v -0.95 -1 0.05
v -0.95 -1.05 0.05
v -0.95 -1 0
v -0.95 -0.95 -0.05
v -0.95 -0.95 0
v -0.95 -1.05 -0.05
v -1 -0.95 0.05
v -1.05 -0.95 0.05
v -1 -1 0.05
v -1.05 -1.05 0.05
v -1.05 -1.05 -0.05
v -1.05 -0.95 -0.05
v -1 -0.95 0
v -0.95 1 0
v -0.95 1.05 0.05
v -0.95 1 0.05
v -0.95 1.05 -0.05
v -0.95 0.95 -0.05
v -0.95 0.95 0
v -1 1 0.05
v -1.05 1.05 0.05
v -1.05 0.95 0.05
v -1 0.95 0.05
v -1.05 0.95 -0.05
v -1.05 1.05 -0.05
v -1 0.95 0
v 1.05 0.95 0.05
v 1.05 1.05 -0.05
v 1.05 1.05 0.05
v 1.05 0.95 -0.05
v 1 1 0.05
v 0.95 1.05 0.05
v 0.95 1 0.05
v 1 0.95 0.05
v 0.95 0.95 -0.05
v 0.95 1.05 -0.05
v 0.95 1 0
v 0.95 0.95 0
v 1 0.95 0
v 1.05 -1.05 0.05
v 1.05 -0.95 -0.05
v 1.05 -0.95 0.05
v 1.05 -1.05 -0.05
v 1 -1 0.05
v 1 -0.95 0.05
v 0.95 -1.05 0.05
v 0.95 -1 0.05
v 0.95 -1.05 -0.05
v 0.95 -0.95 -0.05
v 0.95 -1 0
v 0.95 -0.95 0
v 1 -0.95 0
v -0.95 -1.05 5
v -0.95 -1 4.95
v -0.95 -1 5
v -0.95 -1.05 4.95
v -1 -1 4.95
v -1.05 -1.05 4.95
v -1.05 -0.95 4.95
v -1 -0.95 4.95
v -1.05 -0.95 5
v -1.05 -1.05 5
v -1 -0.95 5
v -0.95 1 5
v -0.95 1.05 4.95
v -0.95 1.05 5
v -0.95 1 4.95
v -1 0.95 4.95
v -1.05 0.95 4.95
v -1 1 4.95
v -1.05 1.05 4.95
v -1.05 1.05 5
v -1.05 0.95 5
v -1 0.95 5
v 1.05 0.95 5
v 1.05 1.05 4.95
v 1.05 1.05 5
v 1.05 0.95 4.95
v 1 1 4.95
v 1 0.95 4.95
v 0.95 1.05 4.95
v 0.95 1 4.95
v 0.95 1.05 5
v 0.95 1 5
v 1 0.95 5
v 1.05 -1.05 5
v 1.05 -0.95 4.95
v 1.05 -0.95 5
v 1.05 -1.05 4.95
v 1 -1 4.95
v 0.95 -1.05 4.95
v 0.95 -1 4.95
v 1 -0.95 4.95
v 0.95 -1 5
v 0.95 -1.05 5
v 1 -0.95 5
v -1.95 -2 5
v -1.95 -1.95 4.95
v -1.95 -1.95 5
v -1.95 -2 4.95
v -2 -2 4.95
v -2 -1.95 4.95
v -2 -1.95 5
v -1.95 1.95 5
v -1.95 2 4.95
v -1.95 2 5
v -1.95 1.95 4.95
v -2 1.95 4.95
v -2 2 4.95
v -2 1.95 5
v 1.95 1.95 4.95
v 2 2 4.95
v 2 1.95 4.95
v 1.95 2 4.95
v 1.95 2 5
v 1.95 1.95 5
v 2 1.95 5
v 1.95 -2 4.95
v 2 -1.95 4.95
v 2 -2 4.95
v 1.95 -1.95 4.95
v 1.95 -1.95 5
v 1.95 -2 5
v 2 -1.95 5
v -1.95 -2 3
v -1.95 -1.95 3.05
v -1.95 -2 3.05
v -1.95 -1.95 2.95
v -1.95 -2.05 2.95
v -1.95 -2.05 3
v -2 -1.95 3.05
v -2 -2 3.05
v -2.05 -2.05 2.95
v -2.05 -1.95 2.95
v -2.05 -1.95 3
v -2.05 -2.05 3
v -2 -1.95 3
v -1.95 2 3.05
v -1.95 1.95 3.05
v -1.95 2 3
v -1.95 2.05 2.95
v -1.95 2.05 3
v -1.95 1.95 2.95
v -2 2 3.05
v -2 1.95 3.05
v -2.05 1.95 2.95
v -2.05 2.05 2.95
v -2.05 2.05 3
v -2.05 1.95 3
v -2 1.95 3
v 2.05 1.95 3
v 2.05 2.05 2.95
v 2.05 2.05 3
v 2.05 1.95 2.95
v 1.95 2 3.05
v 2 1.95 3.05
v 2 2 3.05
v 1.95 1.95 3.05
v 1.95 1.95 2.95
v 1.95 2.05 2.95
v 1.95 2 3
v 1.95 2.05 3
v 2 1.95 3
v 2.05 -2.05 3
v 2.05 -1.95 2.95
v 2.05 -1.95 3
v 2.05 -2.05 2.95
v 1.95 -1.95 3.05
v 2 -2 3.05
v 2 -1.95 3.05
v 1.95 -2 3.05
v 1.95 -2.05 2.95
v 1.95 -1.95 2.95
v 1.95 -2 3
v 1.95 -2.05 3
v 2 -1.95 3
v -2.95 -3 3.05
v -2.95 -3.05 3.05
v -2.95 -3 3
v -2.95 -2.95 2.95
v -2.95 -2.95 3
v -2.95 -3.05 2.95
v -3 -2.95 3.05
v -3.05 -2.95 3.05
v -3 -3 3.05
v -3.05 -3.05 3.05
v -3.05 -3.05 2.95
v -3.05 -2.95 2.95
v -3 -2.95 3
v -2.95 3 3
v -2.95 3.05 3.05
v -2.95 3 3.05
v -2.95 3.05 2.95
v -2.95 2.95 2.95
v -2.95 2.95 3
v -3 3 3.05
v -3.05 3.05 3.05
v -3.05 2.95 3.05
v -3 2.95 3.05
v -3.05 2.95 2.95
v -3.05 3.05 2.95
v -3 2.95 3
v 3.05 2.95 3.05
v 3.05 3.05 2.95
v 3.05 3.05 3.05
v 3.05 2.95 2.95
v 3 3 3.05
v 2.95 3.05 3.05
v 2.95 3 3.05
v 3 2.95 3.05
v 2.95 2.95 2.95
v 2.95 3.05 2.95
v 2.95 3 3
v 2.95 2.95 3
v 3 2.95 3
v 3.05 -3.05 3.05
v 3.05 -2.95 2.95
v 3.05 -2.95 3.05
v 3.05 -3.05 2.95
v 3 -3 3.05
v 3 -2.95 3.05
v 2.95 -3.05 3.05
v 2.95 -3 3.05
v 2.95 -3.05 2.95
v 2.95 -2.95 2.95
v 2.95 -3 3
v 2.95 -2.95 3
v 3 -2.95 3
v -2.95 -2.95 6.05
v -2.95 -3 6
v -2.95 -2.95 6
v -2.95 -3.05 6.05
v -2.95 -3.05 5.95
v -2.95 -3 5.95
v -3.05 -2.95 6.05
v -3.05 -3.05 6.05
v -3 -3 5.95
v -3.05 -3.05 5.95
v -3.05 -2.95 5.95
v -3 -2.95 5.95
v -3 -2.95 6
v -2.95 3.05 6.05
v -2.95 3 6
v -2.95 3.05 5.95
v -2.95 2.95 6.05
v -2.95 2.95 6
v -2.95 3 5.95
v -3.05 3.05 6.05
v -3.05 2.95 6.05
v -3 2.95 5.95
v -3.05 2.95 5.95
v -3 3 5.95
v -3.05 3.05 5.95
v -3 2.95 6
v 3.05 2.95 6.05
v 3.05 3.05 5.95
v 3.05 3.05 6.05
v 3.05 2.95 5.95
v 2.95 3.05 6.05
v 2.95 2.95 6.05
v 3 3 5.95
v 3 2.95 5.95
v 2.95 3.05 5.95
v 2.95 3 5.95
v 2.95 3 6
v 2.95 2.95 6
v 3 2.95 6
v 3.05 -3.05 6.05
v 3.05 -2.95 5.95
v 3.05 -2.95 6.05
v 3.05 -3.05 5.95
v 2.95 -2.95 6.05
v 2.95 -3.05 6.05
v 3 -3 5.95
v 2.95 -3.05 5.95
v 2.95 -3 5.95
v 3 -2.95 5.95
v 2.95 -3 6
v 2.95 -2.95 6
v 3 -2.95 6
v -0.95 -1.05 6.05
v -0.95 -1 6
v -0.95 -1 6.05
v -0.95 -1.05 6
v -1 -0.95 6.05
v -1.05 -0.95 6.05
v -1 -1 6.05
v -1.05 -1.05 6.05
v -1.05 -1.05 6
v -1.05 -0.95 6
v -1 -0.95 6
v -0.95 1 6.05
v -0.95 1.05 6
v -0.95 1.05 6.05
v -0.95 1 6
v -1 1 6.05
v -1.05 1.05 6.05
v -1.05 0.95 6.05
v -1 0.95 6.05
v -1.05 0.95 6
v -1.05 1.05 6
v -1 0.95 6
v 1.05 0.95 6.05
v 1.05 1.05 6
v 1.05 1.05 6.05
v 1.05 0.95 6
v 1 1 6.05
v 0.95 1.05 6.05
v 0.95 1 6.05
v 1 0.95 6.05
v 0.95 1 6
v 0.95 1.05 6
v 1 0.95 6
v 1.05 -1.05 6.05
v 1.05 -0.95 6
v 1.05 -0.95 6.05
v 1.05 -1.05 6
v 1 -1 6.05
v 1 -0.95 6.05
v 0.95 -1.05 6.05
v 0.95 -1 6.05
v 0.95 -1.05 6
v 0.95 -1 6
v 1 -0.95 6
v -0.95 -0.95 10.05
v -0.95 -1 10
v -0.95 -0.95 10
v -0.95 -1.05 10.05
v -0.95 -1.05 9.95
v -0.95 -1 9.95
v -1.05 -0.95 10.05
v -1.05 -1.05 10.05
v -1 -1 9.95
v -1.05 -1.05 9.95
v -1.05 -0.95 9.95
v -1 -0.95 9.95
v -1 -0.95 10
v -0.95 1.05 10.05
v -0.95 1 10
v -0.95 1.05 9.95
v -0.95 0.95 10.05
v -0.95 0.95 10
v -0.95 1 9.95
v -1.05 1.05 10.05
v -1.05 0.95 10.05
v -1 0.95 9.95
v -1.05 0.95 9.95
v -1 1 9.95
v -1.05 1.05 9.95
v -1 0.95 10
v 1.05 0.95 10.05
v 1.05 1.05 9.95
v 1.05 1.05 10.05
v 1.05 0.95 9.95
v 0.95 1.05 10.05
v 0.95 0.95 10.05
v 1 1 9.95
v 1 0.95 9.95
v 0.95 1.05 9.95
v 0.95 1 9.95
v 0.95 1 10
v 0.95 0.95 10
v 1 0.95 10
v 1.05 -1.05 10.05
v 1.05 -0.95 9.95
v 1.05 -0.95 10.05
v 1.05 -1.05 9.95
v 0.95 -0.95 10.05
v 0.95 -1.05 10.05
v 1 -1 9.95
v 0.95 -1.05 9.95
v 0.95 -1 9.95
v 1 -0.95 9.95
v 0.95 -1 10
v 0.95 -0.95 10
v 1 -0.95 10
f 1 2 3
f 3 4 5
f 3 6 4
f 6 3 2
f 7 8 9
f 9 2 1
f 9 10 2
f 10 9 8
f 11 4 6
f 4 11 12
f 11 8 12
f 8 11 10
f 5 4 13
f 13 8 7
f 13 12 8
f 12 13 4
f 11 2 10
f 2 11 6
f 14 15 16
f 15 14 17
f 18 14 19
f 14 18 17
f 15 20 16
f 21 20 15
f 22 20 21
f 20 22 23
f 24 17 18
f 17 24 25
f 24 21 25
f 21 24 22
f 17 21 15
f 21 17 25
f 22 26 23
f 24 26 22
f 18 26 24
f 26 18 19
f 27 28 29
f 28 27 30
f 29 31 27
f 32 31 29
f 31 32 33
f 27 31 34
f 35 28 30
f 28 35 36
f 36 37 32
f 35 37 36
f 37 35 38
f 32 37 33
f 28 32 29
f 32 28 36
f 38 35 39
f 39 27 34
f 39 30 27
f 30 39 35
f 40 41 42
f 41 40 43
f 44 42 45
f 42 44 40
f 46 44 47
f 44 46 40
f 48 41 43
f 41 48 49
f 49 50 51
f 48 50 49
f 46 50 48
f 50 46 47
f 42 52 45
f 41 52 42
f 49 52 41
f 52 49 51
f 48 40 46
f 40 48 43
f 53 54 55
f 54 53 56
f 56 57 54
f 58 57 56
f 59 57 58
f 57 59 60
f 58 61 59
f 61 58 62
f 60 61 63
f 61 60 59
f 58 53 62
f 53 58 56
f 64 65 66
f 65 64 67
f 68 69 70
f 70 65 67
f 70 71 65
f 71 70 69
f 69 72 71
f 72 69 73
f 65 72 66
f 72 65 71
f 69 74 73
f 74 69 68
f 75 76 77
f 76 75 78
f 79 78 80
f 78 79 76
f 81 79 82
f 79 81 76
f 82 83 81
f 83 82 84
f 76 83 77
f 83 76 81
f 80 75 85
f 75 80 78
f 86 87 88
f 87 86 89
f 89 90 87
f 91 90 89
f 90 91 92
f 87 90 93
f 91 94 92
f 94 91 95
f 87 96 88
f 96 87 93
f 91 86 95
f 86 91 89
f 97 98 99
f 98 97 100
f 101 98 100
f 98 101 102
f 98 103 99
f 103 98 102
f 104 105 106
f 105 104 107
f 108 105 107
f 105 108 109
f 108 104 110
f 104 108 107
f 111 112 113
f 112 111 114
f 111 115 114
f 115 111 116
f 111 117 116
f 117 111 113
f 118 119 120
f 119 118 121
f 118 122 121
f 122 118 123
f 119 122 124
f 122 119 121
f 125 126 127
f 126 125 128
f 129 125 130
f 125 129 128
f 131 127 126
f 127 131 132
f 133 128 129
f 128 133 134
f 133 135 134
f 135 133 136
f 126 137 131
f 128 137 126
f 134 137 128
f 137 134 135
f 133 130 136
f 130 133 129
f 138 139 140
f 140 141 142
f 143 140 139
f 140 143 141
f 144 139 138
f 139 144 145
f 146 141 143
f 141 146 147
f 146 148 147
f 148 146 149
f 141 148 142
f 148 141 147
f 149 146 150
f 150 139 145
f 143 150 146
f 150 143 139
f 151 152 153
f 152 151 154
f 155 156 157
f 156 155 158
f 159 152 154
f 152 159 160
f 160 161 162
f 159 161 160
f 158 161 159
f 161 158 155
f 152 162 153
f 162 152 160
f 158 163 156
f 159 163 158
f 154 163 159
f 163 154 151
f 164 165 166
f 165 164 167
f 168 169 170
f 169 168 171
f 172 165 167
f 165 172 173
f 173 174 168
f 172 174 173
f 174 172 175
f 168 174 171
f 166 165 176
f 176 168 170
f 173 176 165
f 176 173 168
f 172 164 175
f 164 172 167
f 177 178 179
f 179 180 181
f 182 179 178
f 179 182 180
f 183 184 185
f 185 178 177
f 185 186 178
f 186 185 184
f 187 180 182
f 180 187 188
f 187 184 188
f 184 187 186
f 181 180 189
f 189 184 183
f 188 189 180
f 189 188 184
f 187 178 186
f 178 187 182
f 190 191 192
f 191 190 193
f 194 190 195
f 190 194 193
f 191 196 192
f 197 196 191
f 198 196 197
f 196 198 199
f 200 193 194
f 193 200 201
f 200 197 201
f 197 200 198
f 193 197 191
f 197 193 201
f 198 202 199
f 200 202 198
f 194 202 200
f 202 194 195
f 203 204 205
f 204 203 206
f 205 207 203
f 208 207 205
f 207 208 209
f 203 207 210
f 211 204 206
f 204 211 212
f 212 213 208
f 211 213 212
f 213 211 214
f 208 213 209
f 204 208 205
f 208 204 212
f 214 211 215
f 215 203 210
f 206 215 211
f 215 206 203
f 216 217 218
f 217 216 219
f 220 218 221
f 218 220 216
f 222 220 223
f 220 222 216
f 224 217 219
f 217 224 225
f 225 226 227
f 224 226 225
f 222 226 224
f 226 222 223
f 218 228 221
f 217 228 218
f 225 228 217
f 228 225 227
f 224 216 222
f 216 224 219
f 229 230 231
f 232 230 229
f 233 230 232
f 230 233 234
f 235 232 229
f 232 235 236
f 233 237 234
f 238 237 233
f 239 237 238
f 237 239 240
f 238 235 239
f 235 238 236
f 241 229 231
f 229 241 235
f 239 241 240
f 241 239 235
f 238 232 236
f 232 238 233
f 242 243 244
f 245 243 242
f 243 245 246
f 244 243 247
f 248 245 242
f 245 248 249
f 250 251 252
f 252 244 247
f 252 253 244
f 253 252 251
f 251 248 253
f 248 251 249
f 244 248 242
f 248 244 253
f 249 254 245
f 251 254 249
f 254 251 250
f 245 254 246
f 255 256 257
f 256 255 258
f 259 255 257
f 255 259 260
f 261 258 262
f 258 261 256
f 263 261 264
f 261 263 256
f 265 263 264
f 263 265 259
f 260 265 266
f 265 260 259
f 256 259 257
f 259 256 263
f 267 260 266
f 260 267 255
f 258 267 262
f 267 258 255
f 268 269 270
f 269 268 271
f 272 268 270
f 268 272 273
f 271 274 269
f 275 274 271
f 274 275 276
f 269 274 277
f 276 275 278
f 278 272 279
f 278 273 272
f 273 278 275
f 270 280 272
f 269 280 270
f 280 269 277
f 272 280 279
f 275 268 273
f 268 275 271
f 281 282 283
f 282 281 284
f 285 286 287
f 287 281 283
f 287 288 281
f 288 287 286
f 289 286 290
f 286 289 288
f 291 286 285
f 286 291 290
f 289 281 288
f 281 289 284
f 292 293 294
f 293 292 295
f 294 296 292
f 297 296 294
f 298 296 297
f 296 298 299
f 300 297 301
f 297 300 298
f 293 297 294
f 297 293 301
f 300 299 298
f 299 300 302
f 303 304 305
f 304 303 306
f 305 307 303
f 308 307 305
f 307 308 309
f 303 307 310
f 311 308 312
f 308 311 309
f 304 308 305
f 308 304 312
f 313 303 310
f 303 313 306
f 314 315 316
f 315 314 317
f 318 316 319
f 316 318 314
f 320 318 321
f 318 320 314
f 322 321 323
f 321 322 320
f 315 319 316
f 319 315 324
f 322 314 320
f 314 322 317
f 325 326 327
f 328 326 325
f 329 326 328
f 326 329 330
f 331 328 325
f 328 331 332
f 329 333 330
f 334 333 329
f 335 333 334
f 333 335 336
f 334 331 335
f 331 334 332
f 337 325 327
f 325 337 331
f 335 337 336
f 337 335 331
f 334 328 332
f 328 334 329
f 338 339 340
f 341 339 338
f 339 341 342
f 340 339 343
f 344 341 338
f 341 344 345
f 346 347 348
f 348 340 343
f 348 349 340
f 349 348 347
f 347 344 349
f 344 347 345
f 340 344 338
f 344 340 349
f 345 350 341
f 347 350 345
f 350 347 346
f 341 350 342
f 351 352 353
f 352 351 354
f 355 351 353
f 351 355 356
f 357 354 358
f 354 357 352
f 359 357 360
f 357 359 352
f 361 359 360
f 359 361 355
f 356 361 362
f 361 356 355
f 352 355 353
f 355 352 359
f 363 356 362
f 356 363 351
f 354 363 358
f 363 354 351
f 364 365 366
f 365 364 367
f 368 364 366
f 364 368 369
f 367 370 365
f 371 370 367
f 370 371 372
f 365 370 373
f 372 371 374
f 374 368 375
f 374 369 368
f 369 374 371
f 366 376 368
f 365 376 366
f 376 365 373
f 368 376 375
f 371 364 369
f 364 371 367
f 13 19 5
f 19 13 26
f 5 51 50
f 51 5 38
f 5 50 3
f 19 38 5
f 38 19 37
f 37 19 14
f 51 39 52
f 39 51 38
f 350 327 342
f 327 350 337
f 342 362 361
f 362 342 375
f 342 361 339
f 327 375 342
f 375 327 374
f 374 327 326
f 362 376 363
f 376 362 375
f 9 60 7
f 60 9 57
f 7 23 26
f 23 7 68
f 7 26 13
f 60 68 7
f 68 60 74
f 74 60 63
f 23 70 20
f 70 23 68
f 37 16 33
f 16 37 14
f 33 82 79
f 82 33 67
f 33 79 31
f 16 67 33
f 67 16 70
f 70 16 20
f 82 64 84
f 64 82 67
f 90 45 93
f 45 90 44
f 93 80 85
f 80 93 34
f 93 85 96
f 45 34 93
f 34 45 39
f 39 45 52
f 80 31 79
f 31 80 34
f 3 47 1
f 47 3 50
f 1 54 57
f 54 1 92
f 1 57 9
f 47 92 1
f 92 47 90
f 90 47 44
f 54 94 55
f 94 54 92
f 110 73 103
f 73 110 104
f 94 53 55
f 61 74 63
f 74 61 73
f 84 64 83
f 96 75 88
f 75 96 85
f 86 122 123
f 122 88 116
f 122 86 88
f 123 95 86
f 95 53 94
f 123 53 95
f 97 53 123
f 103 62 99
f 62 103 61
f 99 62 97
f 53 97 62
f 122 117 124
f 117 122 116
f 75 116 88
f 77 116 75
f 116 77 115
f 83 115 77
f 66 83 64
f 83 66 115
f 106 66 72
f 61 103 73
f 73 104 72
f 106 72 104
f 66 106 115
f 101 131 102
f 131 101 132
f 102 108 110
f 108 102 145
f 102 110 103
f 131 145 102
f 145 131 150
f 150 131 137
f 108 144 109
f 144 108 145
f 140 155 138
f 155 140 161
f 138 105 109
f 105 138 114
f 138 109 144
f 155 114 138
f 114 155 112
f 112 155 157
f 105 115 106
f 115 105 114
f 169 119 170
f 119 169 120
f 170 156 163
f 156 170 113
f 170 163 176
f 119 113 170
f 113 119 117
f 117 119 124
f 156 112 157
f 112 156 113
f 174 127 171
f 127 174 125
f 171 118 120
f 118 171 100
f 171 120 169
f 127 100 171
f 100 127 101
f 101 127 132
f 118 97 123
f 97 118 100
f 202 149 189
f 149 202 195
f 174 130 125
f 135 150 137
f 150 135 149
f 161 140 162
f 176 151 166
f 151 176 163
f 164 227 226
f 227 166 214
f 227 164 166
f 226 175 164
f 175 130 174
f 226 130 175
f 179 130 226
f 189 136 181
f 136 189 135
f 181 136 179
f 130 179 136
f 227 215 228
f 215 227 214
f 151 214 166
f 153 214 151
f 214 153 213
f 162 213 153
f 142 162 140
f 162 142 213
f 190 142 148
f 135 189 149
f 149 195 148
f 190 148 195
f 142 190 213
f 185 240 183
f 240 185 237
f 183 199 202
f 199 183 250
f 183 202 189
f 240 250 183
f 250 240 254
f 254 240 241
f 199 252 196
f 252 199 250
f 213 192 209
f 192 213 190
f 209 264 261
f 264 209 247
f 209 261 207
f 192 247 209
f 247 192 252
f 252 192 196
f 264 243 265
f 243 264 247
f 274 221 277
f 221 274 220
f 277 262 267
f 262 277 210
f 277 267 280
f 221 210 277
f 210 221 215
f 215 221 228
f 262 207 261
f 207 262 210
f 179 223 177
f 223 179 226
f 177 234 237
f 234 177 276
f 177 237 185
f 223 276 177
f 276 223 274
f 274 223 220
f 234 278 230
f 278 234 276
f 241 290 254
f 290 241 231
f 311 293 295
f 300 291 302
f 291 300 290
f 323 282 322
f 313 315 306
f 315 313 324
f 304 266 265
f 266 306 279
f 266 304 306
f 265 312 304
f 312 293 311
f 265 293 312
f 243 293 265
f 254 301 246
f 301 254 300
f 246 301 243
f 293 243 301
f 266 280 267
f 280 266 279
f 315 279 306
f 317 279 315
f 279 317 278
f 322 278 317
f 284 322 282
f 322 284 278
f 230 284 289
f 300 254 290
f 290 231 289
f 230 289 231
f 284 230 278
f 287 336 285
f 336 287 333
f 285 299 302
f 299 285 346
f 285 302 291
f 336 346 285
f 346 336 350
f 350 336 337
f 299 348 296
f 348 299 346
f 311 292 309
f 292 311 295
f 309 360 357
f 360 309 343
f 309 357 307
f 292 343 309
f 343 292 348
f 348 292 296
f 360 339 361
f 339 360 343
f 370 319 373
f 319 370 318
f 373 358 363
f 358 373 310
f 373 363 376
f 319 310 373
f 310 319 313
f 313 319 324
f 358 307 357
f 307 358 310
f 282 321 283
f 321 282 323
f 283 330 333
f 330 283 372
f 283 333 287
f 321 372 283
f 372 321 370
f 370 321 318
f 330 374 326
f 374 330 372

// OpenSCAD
/* ##  #   # # ###  ## ### ### ### ###    ## ### ### ###
 * # # #   # # #   #    #  # # # # #     #   # # #    #
 * ##  #   # # ##   #   #  # # # # ##     #  # # ##   #
 * # # #   # # #     #  #  # # # # #       # # # #    #
 * ##  ### ### ### ##   #  ### # # ###   ##  ### #    #
 *
 * Graphical toolkit module - profile_extrude() - version 1.0
 *
 * Functionally equivalent to
 * ` rotate_extrude(angle = 360)
 * `   polygon(points = profile_points)
 * except instead of rolling around a circle, the profile
 * rolls around another polygon defined by shape_points
 *
 * The difficulty I experienced in this project came from:
 *   - Using polyhedron() for the first time
 *   - Forgetting to debug the shape with Thrown Together mode
 *   - Adding support for a concave profile_points
 *   - Creating an efficient design with as few faces as possible
 *
 * Usage: profile_extrude(profile_points, shape_points, show_points)
 *     profile_points  The desired profile of the new shape
 *     shape_points    The polygon to extrude to the profile
 *     show_points     true/false - Show the computed points
 */

// Test model, showcasing support for concave profiles
profile_extrude(
    profile_points = [
        [1, 0], [1, 5], [2, 5], [2, 3],
        [3, 3], [3, 6], [1, 6], [1, 10]
    ],
    shape_points = [
        [-1, -1], [-1, 1], [1, 1], [1, -1]
    ],
    show_points = true
);

module profile_extrude(profile_points, shape_points, show_points = true) {

    shape_len = len(shape_points);

    // Compute all points required for polyhedron
    new_points = [
        for (p = profile_points)
            for (q = shape_points)
                [q.x * p.x, q.y * p.x, p.y]
    ];

    // If requested, mark points with small cubes
    if (show_points)
        for (p = new_points)
            translate(p)
                cube(0.1, center = true);

    // Create the actual polyhedron
    polyhedron(

        // Pass in the points we've already computed
        points = new_points,

        faces = [

            // End cap for bottom of extruded shape
            [for (i = [shape_len - 1 : -1 : 0]) i],

            // End cap for top of extruded shape
            [for (i = [0 : 1 : shape_len - 1]) len(new_points) - 4 + i],

            // Faces along the profile of shape
            for (j = [0 : 1 : len(profile_points) - 1])
                for (i = [0 : 1 : shape_len - 1])
                    [
                        j * 4 +              i,
                        j * 4 +             (i + 1) % shape_len,
                        j * 4 + shape_len + (i + 1) % shape_len,
                        j * 4 + shape_len +  i
                    ]
            
        ]

    );

}
